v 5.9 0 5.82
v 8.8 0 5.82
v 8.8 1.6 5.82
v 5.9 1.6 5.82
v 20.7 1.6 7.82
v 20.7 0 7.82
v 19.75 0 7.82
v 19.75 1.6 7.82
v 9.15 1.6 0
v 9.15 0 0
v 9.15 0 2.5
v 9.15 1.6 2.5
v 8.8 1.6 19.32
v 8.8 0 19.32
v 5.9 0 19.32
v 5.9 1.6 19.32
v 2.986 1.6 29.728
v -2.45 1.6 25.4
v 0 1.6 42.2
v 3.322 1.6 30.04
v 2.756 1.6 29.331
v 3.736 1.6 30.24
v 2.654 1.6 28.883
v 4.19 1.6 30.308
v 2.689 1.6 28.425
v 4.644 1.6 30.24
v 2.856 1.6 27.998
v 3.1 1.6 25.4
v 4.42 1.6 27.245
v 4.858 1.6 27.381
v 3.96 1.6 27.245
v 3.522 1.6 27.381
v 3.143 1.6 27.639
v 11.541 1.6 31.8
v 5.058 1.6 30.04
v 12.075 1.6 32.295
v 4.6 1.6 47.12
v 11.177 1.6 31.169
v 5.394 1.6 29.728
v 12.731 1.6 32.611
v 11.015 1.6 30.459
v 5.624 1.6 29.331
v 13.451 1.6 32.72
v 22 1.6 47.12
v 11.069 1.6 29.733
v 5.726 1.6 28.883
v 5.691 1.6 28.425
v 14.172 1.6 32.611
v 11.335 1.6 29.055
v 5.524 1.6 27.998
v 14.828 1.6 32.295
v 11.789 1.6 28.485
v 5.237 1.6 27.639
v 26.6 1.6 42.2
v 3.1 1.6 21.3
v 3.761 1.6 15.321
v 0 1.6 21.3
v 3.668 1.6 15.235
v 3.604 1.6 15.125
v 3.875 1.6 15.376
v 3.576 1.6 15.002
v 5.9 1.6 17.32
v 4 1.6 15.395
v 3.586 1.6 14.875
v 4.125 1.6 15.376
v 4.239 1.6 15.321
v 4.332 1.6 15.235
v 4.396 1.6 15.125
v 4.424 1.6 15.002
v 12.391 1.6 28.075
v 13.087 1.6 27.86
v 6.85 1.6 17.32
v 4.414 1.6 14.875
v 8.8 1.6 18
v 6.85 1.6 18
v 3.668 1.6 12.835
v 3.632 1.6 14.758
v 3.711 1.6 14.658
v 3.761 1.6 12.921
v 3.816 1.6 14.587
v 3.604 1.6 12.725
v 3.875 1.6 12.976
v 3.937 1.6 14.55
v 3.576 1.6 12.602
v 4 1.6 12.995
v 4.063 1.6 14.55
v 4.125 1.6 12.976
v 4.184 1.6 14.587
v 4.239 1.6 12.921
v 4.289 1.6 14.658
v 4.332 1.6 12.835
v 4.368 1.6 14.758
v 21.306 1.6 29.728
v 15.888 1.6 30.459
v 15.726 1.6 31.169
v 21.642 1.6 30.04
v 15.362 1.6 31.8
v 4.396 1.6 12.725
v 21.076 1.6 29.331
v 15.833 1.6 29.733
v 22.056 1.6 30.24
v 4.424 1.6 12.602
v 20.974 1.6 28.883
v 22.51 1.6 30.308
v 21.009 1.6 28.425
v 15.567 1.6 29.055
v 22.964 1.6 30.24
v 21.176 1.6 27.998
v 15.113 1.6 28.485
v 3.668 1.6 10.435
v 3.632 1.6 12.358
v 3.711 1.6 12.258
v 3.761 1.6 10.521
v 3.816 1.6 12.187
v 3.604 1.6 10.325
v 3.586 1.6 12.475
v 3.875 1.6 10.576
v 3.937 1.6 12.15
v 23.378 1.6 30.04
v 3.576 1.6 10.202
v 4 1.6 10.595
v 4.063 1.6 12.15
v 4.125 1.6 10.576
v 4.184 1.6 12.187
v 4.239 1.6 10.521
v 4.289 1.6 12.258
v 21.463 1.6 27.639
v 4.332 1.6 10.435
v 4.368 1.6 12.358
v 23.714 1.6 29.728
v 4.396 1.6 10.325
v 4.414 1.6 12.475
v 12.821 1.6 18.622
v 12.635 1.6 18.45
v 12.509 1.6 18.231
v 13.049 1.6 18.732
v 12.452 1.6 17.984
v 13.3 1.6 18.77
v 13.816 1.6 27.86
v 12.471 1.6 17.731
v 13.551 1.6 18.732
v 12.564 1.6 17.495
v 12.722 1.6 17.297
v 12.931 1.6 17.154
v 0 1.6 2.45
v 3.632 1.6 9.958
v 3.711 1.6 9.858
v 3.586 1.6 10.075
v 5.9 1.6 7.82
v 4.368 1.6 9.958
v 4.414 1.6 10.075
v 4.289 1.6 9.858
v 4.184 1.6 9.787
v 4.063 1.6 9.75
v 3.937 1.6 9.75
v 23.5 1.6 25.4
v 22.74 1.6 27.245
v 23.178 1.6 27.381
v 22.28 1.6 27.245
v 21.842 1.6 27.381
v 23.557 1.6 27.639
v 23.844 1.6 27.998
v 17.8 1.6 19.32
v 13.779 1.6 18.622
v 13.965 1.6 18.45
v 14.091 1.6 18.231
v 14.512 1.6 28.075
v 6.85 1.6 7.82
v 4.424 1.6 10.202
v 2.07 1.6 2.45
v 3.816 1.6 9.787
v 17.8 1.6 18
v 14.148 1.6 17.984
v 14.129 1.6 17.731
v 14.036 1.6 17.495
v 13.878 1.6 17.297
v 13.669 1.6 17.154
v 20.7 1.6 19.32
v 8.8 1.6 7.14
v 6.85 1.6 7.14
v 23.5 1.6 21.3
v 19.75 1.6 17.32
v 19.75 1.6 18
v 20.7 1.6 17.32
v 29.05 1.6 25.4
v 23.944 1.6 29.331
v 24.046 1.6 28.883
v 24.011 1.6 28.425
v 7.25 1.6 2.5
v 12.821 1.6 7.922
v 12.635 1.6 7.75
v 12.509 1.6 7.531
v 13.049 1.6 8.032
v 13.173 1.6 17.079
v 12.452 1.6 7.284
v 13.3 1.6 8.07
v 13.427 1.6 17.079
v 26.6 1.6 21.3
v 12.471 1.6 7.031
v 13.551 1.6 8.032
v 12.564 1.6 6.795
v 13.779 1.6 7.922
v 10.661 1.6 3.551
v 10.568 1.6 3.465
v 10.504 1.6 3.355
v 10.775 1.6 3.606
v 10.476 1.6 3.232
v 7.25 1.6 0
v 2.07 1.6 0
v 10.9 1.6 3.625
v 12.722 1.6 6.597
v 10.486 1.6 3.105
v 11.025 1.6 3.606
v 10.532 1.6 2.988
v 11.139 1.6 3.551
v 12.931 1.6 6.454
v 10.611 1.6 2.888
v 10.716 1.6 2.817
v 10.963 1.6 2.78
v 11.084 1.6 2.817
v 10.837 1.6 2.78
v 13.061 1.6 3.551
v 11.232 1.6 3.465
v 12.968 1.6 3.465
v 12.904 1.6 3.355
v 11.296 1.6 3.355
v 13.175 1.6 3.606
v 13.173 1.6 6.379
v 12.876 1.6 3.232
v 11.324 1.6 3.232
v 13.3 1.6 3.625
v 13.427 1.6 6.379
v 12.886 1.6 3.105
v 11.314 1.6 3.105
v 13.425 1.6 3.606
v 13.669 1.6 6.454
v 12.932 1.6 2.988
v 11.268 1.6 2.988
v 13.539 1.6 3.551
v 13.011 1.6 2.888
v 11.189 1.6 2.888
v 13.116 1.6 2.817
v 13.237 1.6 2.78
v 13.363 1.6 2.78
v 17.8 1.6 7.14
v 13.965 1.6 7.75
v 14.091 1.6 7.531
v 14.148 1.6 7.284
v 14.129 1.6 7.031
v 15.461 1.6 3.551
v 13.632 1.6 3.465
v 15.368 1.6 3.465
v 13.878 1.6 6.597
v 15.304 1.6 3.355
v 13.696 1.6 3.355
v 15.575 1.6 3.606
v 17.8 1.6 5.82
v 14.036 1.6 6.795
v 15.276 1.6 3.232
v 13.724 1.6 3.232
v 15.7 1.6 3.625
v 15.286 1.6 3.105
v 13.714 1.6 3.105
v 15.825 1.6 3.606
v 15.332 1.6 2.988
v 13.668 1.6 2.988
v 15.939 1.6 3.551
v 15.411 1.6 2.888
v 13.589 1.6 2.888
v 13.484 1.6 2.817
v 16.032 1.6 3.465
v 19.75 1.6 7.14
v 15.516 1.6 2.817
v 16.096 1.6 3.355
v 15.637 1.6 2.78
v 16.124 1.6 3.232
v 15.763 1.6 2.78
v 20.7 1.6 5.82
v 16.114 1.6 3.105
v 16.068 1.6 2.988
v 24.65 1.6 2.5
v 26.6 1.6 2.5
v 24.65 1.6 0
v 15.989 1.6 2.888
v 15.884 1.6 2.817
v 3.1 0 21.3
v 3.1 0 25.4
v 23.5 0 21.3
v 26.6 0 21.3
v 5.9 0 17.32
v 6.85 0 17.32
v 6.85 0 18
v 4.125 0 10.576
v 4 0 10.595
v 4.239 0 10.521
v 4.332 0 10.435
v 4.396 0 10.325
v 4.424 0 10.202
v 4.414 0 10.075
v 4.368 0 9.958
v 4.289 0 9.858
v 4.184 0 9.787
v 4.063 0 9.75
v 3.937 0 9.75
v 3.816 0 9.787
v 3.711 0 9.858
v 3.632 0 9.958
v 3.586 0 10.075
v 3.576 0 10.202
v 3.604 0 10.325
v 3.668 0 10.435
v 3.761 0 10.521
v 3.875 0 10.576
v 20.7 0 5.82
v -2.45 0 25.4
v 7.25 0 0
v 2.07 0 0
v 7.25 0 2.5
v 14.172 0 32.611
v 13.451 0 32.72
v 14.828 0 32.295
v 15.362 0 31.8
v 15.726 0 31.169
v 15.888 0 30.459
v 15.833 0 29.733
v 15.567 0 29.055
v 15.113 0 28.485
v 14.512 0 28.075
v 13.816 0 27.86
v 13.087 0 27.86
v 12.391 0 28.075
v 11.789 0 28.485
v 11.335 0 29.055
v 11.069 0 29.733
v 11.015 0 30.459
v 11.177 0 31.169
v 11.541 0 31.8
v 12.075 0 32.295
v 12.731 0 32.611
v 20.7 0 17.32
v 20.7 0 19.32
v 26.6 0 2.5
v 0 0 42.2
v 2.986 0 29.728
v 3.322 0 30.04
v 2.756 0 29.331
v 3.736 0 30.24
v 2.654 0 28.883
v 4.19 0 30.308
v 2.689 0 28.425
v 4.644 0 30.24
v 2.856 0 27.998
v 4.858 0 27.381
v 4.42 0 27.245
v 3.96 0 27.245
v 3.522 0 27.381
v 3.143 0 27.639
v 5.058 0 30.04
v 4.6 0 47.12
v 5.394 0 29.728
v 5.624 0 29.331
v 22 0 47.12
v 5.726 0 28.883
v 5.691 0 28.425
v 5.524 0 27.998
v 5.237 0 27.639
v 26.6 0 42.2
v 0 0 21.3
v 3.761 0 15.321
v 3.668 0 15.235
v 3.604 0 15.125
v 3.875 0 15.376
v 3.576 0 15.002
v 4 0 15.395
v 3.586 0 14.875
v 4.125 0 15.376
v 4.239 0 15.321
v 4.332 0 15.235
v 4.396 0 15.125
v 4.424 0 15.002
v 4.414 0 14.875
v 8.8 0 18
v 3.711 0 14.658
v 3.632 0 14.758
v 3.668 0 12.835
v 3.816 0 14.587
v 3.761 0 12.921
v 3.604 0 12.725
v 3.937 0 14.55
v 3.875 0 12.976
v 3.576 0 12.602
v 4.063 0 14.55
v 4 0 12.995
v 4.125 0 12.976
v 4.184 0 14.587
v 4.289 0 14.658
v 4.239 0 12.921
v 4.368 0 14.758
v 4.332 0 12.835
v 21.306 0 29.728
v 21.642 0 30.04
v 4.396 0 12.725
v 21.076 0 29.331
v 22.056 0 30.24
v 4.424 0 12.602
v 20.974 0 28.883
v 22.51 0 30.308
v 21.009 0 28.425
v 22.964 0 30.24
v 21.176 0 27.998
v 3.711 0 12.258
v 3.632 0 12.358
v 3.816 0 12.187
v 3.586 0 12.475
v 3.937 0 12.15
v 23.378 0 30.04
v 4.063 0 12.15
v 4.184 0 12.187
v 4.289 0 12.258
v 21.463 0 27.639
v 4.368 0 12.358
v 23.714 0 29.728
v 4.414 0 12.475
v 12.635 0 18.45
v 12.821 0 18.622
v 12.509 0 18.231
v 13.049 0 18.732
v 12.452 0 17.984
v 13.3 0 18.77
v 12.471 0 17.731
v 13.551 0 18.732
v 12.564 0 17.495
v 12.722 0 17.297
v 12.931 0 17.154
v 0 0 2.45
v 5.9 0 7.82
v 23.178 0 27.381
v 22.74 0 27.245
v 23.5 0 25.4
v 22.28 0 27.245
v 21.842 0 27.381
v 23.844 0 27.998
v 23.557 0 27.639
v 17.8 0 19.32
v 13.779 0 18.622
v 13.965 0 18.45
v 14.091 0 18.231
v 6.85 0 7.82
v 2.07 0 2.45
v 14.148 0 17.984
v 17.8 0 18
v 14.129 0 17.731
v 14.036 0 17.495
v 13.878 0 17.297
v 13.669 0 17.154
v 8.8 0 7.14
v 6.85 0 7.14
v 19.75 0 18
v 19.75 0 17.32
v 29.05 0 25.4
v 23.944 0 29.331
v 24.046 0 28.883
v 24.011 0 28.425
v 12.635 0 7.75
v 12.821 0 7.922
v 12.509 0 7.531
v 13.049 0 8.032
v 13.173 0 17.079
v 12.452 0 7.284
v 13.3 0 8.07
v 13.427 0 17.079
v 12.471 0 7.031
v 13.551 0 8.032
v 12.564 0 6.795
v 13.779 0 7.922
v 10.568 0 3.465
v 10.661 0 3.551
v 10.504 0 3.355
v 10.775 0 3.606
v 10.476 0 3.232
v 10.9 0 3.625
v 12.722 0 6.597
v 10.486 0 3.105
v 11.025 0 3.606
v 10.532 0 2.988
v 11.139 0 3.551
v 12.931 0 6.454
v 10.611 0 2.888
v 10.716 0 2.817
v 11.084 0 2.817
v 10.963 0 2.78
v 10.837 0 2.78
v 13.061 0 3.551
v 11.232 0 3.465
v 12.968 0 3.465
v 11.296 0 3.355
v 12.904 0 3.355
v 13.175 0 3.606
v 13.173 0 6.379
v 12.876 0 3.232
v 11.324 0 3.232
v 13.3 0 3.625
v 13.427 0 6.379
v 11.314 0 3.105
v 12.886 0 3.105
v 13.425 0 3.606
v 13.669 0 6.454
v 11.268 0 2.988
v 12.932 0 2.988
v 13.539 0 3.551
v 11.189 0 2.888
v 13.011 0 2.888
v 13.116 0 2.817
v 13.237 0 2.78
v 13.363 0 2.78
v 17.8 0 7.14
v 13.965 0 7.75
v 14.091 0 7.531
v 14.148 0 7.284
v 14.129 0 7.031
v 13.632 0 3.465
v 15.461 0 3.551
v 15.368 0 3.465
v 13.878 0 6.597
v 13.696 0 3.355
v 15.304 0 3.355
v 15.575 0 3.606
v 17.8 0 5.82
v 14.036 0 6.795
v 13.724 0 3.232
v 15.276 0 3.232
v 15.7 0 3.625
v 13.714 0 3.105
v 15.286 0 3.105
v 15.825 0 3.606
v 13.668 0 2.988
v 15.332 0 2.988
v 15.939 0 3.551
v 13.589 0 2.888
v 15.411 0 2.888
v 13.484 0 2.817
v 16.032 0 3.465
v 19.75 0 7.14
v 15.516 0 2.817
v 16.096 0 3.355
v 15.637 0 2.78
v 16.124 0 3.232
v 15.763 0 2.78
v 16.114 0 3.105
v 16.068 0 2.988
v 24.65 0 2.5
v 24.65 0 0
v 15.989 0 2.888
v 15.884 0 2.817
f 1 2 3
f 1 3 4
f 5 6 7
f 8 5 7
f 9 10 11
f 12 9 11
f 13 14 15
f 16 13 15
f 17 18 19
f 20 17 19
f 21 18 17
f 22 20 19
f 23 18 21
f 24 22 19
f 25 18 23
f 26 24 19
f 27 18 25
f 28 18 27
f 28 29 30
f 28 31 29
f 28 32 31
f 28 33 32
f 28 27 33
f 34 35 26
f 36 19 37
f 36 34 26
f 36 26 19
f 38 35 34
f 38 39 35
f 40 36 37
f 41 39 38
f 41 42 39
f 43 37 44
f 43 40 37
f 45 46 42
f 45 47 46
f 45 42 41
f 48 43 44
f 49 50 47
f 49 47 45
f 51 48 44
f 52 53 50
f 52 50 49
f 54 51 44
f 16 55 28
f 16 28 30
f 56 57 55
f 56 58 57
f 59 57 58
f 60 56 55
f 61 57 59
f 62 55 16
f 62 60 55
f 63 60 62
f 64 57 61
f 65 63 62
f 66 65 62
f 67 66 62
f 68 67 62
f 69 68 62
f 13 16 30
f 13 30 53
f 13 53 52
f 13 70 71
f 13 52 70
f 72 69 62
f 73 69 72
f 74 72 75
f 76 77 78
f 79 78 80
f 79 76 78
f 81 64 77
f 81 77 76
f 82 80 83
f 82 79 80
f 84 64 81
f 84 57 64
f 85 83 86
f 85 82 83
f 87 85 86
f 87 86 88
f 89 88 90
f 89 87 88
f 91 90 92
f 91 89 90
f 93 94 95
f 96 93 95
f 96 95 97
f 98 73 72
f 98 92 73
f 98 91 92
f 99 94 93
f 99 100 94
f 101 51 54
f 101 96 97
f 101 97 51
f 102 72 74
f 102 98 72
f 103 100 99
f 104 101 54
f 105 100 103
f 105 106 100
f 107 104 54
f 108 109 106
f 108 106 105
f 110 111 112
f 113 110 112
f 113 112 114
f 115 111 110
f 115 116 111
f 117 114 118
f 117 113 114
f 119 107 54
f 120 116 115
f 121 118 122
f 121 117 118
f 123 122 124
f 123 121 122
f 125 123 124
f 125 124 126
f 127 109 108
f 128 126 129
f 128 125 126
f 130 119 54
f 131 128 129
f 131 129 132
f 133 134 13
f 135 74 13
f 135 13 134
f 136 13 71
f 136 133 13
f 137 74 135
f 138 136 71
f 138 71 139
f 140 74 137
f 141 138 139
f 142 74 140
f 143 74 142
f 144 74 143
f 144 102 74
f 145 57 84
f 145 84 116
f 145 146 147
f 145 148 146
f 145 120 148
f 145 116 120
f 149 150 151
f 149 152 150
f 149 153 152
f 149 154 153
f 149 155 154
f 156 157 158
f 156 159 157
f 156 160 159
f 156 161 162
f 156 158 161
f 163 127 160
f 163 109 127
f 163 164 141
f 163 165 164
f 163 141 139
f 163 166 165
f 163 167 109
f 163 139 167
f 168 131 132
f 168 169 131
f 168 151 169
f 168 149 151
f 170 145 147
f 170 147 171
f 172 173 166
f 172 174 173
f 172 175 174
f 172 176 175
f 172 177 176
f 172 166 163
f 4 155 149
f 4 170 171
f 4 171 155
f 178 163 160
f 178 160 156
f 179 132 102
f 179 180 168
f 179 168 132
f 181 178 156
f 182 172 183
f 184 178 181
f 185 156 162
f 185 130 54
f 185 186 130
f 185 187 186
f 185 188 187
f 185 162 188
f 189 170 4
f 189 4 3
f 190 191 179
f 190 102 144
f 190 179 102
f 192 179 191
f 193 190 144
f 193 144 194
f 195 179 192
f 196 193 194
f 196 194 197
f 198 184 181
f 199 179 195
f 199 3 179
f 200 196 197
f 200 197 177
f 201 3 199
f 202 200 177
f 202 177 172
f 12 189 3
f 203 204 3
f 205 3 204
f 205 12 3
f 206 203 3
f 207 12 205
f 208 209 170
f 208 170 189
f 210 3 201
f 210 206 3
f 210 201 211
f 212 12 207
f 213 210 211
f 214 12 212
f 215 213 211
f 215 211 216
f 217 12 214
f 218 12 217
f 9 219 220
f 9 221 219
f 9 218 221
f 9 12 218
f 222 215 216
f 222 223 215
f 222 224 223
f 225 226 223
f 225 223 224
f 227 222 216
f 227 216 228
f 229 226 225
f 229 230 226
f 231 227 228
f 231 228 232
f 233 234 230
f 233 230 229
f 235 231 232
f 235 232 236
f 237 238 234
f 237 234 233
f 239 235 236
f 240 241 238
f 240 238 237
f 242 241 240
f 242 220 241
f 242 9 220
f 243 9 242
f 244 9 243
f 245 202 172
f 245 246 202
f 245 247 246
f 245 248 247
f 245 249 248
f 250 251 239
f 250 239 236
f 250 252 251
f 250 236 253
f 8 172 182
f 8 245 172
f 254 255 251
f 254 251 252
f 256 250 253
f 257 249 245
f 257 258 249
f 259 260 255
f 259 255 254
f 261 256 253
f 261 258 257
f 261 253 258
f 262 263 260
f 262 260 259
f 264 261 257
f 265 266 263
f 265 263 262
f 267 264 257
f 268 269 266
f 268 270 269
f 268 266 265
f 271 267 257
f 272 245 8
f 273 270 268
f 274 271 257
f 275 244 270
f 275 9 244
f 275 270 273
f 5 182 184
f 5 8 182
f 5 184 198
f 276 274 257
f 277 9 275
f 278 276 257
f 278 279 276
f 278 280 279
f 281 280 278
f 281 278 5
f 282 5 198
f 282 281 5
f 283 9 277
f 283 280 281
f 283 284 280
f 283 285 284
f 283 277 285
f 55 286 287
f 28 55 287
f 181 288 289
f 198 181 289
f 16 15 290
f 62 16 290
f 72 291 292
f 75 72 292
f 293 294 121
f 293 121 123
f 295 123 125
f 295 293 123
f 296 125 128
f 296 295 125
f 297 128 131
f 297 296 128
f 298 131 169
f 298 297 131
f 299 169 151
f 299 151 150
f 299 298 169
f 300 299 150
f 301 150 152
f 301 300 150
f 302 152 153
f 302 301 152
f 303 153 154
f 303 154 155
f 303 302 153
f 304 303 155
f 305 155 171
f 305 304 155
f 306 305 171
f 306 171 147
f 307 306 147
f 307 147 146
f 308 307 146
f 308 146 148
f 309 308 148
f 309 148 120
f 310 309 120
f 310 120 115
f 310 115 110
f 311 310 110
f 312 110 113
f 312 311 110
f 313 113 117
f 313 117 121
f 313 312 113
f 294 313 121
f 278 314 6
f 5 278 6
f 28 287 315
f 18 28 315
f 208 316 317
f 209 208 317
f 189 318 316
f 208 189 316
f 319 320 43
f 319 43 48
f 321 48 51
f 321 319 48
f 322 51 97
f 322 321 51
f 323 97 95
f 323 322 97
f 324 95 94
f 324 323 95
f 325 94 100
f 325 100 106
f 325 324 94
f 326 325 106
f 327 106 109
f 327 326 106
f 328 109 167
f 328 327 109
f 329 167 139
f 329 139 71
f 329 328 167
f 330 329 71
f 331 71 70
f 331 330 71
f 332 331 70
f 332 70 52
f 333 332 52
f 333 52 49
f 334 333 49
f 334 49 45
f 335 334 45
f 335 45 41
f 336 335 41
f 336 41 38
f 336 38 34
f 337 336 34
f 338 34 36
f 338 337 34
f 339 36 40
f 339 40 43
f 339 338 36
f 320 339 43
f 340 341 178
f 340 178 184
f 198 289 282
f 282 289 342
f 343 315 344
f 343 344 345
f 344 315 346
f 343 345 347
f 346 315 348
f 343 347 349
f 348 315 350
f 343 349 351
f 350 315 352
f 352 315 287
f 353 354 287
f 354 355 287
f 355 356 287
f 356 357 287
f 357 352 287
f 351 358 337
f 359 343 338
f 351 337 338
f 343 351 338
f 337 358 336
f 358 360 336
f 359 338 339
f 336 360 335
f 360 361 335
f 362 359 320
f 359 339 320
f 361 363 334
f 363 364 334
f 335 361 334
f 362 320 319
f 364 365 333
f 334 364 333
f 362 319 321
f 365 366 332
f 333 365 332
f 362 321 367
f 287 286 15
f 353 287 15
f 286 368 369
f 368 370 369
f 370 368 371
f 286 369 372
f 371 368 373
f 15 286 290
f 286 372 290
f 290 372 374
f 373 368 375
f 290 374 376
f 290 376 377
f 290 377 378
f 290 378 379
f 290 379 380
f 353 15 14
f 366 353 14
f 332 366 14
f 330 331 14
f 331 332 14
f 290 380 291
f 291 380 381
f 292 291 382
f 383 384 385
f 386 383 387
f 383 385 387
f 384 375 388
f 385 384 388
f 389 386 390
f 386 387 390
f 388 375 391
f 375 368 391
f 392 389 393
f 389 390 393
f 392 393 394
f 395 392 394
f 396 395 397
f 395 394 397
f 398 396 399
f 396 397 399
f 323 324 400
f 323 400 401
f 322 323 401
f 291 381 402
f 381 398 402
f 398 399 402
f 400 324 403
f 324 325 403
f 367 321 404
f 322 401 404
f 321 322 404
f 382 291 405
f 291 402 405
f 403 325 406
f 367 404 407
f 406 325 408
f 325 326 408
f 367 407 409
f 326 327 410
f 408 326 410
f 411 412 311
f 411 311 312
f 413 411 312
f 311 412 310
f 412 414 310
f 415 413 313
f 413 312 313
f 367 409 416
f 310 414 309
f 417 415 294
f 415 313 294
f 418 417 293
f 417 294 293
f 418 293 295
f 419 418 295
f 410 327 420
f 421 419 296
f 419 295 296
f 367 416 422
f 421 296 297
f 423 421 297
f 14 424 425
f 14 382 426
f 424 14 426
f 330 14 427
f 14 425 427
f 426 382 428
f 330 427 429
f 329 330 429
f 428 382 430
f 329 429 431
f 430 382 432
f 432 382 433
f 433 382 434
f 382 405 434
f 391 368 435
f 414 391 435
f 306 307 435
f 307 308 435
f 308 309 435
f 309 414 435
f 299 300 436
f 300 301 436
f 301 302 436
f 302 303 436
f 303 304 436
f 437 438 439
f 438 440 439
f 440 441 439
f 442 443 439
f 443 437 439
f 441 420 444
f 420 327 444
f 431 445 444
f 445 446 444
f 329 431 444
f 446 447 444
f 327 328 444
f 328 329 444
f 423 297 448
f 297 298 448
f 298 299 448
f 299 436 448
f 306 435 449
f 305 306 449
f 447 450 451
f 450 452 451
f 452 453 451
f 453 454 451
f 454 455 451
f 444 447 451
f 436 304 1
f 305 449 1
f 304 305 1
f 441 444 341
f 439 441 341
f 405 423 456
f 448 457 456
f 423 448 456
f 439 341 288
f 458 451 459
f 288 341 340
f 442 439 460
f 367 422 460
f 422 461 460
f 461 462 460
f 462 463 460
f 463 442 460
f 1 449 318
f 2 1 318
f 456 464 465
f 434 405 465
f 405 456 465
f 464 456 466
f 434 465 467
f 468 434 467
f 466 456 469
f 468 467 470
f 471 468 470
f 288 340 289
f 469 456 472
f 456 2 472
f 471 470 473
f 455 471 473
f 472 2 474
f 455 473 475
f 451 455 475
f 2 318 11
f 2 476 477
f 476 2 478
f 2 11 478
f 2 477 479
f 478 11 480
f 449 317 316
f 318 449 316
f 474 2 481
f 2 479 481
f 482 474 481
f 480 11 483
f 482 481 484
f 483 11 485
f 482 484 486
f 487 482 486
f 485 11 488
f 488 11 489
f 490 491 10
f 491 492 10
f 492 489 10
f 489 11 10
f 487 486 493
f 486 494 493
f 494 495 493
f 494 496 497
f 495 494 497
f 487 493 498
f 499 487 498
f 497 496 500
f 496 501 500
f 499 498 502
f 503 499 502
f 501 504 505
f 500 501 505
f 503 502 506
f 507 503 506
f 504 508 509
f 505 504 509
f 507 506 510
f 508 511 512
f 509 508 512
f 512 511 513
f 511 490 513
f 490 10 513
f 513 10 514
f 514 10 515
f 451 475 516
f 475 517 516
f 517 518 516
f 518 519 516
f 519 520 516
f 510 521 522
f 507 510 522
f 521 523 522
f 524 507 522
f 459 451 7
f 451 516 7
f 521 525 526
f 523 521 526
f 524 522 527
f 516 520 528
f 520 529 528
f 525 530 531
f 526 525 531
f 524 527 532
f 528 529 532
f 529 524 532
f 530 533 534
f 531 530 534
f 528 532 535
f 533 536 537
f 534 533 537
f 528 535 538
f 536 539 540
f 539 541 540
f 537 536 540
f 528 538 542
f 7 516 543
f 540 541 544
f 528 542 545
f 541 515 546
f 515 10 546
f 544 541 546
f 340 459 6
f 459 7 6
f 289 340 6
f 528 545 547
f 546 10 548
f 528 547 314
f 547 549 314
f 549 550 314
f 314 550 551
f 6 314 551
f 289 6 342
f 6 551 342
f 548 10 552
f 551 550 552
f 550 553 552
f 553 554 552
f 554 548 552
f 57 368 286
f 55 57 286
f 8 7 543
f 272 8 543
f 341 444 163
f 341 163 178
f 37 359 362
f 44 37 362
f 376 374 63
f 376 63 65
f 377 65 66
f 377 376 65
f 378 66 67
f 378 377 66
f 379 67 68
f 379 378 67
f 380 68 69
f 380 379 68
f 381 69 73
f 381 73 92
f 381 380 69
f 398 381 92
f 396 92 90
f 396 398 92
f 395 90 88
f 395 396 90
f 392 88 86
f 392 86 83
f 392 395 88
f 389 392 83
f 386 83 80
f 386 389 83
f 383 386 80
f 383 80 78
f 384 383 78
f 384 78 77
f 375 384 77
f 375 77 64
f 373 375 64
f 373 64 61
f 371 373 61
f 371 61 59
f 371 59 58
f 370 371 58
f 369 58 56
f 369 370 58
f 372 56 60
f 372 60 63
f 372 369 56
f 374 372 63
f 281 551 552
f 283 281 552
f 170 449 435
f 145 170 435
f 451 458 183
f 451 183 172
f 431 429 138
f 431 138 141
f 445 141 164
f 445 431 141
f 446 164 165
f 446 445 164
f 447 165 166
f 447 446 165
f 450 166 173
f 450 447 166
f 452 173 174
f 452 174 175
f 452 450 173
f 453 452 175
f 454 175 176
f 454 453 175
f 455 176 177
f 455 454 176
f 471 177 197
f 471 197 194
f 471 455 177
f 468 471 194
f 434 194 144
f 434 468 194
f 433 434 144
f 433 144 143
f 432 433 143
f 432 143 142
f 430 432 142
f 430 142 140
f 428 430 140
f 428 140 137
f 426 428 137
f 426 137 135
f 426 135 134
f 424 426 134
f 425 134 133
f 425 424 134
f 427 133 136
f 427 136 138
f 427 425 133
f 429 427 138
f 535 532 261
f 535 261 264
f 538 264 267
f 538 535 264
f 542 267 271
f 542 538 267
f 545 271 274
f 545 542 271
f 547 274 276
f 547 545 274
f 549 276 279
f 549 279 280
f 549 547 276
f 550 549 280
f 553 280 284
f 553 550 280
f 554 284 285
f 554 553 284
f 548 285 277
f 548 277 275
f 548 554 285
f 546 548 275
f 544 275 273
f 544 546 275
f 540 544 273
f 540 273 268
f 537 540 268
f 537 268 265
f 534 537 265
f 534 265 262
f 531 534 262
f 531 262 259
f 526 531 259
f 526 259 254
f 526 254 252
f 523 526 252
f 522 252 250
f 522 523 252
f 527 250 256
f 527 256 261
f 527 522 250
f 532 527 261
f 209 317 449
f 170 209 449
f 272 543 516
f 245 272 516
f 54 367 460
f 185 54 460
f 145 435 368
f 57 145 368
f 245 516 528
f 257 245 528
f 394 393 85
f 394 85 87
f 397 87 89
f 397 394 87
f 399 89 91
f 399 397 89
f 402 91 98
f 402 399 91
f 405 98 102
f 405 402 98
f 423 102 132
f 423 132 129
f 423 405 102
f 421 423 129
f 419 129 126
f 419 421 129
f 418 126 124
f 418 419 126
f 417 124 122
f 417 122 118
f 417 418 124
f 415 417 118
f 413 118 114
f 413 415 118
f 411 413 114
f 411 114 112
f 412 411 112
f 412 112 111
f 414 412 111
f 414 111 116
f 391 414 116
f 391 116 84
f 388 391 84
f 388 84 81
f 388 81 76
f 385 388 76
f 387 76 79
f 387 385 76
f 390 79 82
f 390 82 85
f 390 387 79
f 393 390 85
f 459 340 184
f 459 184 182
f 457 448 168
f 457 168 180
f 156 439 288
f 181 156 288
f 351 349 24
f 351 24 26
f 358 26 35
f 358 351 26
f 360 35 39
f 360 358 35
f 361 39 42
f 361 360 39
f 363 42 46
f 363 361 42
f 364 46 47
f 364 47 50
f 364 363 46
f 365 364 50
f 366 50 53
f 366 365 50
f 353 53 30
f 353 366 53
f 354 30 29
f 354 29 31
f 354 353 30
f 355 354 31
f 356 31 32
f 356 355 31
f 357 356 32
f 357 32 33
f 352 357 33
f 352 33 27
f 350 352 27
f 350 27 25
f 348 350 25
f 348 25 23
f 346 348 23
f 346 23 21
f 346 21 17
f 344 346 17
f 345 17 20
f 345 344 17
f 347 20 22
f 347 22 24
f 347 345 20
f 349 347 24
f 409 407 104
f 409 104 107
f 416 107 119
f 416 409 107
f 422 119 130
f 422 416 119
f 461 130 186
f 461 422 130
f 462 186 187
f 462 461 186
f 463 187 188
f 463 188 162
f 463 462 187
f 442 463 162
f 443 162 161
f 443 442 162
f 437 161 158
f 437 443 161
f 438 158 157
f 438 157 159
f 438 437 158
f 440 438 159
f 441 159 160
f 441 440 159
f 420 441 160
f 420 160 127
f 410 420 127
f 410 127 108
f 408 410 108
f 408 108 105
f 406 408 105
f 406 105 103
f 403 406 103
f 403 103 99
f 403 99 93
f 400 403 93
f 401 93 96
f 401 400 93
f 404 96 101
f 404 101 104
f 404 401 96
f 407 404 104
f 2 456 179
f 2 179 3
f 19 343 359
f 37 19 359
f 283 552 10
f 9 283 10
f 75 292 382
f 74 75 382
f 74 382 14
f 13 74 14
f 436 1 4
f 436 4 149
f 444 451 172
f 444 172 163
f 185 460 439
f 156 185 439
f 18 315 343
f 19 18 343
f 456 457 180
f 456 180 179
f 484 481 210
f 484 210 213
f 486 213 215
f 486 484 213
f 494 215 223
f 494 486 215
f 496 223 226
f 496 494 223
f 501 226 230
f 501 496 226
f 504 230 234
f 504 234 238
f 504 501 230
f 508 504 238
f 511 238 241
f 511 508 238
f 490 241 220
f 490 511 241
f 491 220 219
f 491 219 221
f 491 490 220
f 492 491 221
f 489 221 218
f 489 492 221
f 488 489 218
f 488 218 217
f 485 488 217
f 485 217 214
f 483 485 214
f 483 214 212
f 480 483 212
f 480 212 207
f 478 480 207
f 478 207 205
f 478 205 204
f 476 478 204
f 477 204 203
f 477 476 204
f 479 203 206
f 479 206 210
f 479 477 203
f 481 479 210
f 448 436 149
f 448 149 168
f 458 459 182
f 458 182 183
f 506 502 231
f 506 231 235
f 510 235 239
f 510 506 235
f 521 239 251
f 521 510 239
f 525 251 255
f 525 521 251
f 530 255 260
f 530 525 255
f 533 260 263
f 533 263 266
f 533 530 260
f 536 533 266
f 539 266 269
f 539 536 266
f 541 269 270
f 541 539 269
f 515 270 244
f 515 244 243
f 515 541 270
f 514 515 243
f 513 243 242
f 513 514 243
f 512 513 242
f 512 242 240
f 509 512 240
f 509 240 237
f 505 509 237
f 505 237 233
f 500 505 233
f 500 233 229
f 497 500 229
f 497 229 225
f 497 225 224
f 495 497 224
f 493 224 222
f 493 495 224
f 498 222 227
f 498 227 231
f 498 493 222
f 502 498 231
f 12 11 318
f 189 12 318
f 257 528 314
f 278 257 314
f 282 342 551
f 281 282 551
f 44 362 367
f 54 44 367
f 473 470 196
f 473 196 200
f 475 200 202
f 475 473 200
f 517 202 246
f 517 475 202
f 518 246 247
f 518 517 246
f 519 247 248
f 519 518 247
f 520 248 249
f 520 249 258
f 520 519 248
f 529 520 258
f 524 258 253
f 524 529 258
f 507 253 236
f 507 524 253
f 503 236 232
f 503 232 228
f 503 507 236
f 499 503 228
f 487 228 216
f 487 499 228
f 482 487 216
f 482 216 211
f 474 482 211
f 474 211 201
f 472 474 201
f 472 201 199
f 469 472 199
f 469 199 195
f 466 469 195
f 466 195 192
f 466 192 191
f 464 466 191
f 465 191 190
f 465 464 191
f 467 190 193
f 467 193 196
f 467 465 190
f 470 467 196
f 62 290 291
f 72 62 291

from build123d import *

# Parameters (mm, degrees)
SKETCH1_R           = 1.54
SKETCH1_R_2         = 2.443409063
SKETCH1_R_3         = 0.85
SKETCH1_R_4         = 0.425
BOSS_EXTRUDE1_DEPTH = 1.6


with BuildPart() as part:
    # Sketch1 → Boss-Extrude1 (new body)
    with BuildSketch(Plane(origin=(0, 0, 0), x_dir=(1, 0, 0), z_dir=(0, 1, 0))):
        Polygon((2.07, 0), (2.07, -2.45), (0, -2.45), (0, -21.3), (3.1, -21.3), (3.1, -25.4), (0, -25.4), (-2.45, -25.4), (0, -42.2), (4.6, -47.12), (22, -47.12), (26.6, -42.2), (29.05, -25.4), (26.6, -25.4), (23.5, -25.4), (23.5, -21.3), (26.6, -21.3), (26.6, -2.5), (24.65, -2.5), (24.65, 0), (9.15, 0), (9.15, -2.5), (7.25, -2.5), (7.25, 0), align=None)
        with Locations(Location((22.51, -28.768011283, 0), (0, 0, 270))):
            Circle(SKETCH1_R, mode=Mode.SUBTRACT)
        with Locations(Location((4.19, -28.768011283, 0), (0, 0, 270))):
            Circle(SKETCH1_R, mode=Mode.SUBTRACT)
        with Locations(Location((13.451347261, -30.276590937, 0), (0, 0, 270))):
            Circle(SKETCH1_R_2, mode=Mode.SUBTRACT)
        with Locations(Location((13.3, -7.22, 0), (0, 0, 270))):
            Circle(SKETCH1_R_3, mode=Mode.SUBTRACT)
        with Locations(Location((13.3, -17.92, 0), (0, 0, 270))):
            Circle(SKETCH1_R_3, mode=Mode.SUBTRACT)
        with Locations(Location((13.3, -3.2, 0), (0, 0, 270))):
            Circle(SKETCH1_R_4, mode=Mode.SUBTRACT)
        with Locations(Location((15.7, -3.2, 0), (0, 0, 270))):
            Circle(SKETCH1_R_4, mode=Mode.SUBTRACT)
        with Locations(Location((10.9, -3.2, 0), (0, 0, 270))):
            Circle(SKETCH1_R_4, mode=Mode.SUBTRACT)
        with Locations(Location((4, -14.97, 0), (0, 0, 270))):
            Circle(SKETCH1_R_4, mode=Mode.SUBTRACT)
        with Locations(Location((4, -12.57, 0), (0, 0, 270))):
            Circle(SKETCH1_R_4, mode=Mode.SUBTRACT)
        with Locations(Location((4, -10.17, 0), (0, 0, 270))):
            Circle(SKETCH1_R_4, mode=Mode.SUBTRACT)
        Polygon((20.7, -19.32), (20.7, -17.32), (19.75, -17.32), (19.75, -18), (17.8, -18), (17.8, -19.32), align=None, mode=Mode.SUBTRACT)
        Polygon((8.8, -19.32), (5.9, -19.32), (5.9, -17.32), (6.85, -17.32), (6.85, -18), (8.8, -18), align=None, mode=Mode.SUBTRACT)
        Polygon((17.8, -5.82), (20.7, -5.82), (20.7, -7.82), (19.75, -7.82), (19.75, -7.14), (17.8, -7.14), align=None, mode=Mode.SUBTRACT)
        Polygon((5.9, -5.82), (5.9, -7.82), (6.85, -7.82), (6.85, -7.14), (8.8, -7.14), (8.8, -5.82), align=None, mode=Mode.SUBTRACT)
    extrude(amount=BOSS_EXTRUDE1_DEPTH)


solid = part.part
